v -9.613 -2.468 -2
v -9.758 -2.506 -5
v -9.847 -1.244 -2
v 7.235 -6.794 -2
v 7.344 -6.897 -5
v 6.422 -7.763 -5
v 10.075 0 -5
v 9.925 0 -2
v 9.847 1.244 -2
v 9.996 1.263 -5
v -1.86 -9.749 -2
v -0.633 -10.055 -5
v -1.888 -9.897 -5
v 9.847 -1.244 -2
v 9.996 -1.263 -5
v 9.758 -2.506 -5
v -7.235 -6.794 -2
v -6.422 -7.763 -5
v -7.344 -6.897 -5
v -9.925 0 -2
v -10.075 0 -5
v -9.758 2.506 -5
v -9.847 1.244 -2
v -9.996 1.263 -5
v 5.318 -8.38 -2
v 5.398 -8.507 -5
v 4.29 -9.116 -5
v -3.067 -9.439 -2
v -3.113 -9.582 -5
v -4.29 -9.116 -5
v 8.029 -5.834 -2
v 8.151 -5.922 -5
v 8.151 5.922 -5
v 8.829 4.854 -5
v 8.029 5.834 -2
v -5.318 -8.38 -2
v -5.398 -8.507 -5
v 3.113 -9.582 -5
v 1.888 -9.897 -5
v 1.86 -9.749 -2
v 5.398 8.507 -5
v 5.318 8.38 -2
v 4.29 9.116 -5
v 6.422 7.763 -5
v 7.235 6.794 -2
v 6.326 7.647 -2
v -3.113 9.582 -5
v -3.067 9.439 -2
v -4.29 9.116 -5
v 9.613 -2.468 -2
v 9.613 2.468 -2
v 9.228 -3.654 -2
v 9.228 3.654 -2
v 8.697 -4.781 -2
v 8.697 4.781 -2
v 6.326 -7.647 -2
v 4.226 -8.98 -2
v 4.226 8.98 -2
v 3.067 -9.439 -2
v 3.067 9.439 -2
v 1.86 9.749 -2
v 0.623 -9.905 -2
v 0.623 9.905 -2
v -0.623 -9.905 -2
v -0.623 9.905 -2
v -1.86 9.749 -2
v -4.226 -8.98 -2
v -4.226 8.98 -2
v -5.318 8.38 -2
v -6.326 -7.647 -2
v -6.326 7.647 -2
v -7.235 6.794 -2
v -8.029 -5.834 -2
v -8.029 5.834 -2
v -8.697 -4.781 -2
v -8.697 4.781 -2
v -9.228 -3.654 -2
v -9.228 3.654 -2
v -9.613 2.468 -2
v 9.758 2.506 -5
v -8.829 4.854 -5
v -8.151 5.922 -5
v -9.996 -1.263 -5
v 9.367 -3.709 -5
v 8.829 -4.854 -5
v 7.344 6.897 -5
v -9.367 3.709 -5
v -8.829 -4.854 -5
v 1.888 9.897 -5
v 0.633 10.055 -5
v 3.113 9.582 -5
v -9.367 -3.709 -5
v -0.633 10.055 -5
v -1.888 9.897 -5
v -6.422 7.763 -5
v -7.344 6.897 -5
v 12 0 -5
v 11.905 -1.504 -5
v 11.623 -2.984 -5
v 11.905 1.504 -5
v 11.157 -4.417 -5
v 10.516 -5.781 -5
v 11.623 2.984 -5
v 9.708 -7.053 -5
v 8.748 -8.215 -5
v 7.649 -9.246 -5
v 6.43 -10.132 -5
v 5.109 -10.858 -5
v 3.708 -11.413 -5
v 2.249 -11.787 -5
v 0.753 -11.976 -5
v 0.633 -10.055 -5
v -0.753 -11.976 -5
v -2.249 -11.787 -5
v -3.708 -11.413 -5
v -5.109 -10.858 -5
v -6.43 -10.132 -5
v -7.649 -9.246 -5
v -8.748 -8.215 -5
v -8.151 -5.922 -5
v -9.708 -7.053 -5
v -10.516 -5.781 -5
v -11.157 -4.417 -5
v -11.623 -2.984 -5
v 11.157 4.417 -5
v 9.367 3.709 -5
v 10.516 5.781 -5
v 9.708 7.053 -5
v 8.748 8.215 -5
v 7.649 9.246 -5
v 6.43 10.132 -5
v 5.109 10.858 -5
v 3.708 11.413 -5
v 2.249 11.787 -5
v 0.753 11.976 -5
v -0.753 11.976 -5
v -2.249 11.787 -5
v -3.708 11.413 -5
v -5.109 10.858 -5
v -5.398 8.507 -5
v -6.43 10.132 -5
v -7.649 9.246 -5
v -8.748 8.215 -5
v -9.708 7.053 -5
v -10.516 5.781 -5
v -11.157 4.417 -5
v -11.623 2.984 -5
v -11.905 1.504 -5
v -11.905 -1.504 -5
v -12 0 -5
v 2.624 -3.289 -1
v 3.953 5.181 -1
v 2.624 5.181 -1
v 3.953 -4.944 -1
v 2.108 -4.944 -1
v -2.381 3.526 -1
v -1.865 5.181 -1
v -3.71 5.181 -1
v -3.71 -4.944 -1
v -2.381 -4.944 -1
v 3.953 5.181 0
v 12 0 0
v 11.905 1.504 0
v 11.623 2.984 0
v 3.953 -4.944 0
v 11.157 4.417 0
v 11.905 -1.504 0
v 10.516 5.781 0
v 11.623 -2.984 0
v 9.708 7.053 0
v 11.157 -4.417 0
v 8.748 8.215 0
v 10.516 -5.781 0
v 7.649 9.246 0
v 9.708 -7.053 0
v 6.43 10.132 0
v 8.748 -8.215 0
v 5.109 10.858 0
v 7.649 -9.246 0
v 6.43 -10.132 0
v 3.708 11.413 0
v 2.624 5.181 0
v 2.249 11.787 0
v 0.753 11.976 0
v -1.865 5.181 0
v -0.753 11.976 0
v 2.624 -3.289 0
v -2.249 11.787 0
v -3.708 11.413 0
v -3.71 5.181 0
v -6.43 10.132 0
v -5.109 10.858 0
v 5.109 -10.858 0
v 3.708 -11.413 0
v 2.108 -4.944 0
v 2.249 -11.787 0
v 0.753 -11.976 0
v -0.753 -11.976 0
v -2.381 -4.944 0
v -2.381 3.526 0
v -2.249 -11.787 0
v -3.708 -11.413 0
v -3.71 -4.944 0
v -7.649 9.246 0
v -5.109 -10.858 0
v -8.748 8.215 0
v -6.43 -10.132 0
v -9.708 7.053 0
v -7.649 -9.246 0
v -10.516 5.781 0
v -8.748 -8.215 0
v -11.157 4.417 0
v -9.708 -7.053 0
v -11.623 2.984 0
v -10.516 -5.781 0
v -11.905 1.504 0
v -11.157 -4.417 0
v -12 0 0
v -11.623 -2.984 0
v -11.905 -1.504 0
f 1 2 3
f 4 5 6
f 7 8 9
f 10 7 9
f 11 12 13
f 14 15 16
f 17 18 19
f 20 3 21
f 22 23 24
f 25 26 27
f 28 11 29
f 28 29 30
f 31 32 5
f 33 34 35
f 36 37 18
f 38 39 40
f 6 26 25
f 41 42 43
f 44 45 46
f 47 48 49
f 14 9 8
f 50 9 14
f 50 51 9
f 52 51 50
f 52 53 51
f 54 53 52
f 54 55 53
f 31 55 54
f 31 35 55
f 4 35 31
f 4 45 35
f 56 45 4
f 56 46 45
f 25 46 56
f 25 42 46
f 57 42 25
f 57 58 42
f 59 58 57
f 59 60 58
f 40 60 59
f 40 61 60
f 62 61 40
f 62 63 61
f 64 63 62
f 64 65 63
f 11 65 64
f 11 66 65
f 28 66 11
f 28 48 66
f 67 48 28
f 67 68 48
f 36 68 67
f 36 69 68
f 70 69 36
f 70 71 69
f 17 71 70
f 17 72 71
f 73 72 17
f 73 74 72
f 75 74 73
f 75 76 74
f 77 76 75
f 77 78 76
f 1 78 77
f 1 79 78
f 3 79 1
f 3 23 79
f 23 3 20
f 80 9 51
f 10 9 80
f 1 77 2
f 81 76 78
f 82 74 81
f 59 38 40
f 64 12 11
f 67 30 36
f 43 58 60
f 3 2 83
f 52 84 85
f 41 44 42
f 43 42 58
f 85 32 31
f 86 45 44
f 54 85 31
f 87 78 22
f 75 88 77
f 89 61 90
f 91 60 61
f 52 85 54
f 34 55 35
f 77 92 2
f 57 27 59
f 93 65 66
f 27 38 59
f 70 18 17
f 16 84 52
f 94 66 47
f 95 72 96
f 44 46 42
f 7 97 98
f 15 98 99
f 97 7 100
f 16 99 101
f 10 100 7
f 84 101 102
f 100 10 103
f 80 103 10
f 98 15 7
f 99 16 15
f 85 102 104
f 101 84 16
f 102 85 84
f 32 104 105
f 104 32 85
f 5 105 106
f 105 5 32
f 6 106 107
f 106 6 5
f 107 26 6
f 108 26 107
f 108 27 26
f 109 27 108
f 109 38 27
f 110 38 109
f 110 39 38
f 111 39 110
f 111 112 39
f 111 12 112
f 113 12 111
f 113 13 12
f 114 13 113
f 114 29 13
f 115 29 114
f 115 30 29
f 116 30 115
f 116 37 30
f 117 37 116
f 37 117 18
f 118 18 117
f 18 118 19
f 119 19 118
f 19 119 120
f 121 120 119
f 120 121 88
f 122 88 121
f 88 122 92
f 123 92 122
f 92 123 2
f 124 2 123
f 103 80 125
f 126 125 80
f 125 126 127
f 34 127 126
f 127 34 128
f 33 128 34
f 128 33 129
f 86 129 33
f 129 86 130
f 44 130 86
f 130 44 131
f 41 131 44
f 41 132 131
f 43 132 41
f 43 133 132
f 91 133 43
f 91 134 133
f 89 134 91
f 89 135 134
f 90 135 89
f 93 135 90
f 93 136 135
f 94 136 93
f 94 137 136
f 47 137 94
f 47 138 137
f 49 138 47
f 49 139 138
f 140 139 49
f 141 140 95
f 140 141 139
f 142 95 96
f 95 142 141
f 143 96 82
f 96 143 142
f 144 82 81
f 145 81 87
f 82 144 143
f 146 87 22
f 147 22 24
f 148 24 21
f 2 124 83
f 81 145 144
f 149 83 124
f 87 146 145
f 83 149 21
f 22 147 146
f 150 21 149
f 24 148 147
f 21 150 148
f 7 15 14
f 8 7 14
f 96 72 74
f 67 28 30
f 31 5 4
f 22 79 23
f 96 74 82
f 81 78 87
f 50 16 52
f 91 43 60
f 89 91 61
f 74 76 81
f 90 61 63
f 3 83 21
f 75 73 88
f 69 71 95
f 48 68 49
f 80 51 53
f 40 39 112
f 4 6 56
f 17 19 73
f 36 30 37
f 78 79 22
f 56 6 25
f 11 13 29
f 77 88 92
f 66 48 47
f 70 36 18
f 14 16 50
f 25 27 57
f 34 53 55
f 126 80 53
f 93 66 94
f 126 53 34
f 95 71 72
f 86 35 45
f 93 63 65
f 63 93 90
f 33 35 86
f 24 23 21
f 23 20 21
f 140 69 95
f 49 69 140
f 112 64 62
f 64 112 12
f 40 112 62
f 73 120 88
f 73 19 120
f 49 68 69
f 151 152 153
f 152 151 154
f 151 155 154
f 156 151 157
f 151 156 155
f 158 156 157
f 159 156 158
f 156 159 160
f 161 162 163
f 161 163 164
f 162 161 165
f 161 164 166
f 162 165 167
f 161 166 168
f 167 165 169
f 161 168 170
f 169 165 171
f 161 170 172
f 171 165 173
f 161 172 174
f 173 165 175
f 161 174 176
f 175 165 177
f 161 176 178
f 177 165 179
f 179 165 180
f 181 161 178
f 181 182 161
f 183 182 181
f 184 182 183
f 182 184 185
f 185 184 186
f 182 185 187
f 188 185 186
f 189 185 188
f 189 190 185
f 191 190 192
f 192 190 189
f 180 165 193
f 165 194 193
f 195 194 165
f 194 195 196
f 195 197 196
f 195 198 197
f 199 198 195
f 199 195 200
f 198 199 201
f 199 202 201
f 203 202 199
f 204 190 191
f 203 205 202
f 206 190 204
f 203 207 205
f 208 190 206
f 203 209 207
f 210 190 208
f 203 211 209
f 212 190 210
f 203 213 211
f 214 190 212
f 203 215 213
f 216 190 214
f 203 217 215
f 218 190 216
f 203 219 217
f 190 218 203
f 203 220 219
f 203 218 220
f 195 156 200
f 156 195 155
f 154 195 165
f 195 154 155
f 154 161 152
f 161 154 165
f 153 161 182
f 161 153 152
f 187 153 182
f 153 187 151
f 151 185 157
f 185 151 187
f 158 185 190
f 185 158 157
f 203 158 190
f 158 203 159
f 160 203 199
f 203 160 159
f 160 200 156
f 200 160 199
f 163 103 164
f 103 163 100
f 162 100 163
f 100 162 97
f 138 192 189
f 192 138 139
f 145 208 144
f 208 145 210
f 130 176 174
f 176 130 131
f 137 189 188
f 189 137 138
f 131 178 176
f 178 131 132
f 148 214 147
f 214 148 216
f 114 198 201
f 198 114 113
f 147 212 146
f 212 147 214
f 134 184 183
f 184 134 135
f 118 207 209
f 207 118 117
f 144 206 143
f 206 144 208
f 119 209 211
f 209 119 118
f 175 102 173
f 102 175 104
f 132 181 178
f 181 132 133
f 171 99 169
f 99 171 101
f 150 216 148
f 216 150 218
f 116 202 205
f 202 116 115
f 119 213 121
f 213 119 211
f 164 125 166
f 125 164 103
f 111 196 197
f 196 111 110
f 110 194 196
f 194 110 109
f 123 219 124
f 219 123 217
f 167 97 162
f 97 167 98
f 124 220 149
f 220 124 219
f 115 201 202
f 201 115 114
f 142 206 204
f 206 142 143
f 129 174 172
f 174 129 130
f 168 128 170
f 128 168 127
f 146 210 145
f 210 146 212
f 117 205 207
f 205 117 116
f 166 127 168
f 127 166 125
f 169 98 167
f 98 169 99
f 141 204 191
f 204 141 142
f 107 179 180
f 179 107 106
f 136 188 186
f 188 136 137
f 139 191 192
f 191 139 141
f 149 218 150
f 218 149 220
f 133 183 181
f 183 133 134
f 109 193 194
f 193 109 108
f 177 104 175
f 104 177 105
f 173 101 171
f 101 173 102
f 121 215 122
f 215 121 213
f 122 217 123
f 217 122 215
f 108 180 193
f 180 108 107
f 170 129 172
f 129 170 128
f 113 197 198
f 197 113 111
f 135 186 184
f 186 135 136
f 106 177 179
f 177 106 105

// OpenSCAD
$fn = 50;

difference() {
	union() {
		translate(v = [0, 0, -5.0]) {
			cylinder(h = 5, r = 12.0);
		}
	}
	union() {
		#translate(v = [0, 0, -5.0]) {
			cylinder(h = 3, r1 = 10.075, r2 = 9.925);
		}
		translate(v = [0, 0, -1]) {
			linear_extrude(height = 1) {
				text(font = "Impact", halign = "center", size = 10, text = "N", valign = "center");
			}
		}
	}
}
